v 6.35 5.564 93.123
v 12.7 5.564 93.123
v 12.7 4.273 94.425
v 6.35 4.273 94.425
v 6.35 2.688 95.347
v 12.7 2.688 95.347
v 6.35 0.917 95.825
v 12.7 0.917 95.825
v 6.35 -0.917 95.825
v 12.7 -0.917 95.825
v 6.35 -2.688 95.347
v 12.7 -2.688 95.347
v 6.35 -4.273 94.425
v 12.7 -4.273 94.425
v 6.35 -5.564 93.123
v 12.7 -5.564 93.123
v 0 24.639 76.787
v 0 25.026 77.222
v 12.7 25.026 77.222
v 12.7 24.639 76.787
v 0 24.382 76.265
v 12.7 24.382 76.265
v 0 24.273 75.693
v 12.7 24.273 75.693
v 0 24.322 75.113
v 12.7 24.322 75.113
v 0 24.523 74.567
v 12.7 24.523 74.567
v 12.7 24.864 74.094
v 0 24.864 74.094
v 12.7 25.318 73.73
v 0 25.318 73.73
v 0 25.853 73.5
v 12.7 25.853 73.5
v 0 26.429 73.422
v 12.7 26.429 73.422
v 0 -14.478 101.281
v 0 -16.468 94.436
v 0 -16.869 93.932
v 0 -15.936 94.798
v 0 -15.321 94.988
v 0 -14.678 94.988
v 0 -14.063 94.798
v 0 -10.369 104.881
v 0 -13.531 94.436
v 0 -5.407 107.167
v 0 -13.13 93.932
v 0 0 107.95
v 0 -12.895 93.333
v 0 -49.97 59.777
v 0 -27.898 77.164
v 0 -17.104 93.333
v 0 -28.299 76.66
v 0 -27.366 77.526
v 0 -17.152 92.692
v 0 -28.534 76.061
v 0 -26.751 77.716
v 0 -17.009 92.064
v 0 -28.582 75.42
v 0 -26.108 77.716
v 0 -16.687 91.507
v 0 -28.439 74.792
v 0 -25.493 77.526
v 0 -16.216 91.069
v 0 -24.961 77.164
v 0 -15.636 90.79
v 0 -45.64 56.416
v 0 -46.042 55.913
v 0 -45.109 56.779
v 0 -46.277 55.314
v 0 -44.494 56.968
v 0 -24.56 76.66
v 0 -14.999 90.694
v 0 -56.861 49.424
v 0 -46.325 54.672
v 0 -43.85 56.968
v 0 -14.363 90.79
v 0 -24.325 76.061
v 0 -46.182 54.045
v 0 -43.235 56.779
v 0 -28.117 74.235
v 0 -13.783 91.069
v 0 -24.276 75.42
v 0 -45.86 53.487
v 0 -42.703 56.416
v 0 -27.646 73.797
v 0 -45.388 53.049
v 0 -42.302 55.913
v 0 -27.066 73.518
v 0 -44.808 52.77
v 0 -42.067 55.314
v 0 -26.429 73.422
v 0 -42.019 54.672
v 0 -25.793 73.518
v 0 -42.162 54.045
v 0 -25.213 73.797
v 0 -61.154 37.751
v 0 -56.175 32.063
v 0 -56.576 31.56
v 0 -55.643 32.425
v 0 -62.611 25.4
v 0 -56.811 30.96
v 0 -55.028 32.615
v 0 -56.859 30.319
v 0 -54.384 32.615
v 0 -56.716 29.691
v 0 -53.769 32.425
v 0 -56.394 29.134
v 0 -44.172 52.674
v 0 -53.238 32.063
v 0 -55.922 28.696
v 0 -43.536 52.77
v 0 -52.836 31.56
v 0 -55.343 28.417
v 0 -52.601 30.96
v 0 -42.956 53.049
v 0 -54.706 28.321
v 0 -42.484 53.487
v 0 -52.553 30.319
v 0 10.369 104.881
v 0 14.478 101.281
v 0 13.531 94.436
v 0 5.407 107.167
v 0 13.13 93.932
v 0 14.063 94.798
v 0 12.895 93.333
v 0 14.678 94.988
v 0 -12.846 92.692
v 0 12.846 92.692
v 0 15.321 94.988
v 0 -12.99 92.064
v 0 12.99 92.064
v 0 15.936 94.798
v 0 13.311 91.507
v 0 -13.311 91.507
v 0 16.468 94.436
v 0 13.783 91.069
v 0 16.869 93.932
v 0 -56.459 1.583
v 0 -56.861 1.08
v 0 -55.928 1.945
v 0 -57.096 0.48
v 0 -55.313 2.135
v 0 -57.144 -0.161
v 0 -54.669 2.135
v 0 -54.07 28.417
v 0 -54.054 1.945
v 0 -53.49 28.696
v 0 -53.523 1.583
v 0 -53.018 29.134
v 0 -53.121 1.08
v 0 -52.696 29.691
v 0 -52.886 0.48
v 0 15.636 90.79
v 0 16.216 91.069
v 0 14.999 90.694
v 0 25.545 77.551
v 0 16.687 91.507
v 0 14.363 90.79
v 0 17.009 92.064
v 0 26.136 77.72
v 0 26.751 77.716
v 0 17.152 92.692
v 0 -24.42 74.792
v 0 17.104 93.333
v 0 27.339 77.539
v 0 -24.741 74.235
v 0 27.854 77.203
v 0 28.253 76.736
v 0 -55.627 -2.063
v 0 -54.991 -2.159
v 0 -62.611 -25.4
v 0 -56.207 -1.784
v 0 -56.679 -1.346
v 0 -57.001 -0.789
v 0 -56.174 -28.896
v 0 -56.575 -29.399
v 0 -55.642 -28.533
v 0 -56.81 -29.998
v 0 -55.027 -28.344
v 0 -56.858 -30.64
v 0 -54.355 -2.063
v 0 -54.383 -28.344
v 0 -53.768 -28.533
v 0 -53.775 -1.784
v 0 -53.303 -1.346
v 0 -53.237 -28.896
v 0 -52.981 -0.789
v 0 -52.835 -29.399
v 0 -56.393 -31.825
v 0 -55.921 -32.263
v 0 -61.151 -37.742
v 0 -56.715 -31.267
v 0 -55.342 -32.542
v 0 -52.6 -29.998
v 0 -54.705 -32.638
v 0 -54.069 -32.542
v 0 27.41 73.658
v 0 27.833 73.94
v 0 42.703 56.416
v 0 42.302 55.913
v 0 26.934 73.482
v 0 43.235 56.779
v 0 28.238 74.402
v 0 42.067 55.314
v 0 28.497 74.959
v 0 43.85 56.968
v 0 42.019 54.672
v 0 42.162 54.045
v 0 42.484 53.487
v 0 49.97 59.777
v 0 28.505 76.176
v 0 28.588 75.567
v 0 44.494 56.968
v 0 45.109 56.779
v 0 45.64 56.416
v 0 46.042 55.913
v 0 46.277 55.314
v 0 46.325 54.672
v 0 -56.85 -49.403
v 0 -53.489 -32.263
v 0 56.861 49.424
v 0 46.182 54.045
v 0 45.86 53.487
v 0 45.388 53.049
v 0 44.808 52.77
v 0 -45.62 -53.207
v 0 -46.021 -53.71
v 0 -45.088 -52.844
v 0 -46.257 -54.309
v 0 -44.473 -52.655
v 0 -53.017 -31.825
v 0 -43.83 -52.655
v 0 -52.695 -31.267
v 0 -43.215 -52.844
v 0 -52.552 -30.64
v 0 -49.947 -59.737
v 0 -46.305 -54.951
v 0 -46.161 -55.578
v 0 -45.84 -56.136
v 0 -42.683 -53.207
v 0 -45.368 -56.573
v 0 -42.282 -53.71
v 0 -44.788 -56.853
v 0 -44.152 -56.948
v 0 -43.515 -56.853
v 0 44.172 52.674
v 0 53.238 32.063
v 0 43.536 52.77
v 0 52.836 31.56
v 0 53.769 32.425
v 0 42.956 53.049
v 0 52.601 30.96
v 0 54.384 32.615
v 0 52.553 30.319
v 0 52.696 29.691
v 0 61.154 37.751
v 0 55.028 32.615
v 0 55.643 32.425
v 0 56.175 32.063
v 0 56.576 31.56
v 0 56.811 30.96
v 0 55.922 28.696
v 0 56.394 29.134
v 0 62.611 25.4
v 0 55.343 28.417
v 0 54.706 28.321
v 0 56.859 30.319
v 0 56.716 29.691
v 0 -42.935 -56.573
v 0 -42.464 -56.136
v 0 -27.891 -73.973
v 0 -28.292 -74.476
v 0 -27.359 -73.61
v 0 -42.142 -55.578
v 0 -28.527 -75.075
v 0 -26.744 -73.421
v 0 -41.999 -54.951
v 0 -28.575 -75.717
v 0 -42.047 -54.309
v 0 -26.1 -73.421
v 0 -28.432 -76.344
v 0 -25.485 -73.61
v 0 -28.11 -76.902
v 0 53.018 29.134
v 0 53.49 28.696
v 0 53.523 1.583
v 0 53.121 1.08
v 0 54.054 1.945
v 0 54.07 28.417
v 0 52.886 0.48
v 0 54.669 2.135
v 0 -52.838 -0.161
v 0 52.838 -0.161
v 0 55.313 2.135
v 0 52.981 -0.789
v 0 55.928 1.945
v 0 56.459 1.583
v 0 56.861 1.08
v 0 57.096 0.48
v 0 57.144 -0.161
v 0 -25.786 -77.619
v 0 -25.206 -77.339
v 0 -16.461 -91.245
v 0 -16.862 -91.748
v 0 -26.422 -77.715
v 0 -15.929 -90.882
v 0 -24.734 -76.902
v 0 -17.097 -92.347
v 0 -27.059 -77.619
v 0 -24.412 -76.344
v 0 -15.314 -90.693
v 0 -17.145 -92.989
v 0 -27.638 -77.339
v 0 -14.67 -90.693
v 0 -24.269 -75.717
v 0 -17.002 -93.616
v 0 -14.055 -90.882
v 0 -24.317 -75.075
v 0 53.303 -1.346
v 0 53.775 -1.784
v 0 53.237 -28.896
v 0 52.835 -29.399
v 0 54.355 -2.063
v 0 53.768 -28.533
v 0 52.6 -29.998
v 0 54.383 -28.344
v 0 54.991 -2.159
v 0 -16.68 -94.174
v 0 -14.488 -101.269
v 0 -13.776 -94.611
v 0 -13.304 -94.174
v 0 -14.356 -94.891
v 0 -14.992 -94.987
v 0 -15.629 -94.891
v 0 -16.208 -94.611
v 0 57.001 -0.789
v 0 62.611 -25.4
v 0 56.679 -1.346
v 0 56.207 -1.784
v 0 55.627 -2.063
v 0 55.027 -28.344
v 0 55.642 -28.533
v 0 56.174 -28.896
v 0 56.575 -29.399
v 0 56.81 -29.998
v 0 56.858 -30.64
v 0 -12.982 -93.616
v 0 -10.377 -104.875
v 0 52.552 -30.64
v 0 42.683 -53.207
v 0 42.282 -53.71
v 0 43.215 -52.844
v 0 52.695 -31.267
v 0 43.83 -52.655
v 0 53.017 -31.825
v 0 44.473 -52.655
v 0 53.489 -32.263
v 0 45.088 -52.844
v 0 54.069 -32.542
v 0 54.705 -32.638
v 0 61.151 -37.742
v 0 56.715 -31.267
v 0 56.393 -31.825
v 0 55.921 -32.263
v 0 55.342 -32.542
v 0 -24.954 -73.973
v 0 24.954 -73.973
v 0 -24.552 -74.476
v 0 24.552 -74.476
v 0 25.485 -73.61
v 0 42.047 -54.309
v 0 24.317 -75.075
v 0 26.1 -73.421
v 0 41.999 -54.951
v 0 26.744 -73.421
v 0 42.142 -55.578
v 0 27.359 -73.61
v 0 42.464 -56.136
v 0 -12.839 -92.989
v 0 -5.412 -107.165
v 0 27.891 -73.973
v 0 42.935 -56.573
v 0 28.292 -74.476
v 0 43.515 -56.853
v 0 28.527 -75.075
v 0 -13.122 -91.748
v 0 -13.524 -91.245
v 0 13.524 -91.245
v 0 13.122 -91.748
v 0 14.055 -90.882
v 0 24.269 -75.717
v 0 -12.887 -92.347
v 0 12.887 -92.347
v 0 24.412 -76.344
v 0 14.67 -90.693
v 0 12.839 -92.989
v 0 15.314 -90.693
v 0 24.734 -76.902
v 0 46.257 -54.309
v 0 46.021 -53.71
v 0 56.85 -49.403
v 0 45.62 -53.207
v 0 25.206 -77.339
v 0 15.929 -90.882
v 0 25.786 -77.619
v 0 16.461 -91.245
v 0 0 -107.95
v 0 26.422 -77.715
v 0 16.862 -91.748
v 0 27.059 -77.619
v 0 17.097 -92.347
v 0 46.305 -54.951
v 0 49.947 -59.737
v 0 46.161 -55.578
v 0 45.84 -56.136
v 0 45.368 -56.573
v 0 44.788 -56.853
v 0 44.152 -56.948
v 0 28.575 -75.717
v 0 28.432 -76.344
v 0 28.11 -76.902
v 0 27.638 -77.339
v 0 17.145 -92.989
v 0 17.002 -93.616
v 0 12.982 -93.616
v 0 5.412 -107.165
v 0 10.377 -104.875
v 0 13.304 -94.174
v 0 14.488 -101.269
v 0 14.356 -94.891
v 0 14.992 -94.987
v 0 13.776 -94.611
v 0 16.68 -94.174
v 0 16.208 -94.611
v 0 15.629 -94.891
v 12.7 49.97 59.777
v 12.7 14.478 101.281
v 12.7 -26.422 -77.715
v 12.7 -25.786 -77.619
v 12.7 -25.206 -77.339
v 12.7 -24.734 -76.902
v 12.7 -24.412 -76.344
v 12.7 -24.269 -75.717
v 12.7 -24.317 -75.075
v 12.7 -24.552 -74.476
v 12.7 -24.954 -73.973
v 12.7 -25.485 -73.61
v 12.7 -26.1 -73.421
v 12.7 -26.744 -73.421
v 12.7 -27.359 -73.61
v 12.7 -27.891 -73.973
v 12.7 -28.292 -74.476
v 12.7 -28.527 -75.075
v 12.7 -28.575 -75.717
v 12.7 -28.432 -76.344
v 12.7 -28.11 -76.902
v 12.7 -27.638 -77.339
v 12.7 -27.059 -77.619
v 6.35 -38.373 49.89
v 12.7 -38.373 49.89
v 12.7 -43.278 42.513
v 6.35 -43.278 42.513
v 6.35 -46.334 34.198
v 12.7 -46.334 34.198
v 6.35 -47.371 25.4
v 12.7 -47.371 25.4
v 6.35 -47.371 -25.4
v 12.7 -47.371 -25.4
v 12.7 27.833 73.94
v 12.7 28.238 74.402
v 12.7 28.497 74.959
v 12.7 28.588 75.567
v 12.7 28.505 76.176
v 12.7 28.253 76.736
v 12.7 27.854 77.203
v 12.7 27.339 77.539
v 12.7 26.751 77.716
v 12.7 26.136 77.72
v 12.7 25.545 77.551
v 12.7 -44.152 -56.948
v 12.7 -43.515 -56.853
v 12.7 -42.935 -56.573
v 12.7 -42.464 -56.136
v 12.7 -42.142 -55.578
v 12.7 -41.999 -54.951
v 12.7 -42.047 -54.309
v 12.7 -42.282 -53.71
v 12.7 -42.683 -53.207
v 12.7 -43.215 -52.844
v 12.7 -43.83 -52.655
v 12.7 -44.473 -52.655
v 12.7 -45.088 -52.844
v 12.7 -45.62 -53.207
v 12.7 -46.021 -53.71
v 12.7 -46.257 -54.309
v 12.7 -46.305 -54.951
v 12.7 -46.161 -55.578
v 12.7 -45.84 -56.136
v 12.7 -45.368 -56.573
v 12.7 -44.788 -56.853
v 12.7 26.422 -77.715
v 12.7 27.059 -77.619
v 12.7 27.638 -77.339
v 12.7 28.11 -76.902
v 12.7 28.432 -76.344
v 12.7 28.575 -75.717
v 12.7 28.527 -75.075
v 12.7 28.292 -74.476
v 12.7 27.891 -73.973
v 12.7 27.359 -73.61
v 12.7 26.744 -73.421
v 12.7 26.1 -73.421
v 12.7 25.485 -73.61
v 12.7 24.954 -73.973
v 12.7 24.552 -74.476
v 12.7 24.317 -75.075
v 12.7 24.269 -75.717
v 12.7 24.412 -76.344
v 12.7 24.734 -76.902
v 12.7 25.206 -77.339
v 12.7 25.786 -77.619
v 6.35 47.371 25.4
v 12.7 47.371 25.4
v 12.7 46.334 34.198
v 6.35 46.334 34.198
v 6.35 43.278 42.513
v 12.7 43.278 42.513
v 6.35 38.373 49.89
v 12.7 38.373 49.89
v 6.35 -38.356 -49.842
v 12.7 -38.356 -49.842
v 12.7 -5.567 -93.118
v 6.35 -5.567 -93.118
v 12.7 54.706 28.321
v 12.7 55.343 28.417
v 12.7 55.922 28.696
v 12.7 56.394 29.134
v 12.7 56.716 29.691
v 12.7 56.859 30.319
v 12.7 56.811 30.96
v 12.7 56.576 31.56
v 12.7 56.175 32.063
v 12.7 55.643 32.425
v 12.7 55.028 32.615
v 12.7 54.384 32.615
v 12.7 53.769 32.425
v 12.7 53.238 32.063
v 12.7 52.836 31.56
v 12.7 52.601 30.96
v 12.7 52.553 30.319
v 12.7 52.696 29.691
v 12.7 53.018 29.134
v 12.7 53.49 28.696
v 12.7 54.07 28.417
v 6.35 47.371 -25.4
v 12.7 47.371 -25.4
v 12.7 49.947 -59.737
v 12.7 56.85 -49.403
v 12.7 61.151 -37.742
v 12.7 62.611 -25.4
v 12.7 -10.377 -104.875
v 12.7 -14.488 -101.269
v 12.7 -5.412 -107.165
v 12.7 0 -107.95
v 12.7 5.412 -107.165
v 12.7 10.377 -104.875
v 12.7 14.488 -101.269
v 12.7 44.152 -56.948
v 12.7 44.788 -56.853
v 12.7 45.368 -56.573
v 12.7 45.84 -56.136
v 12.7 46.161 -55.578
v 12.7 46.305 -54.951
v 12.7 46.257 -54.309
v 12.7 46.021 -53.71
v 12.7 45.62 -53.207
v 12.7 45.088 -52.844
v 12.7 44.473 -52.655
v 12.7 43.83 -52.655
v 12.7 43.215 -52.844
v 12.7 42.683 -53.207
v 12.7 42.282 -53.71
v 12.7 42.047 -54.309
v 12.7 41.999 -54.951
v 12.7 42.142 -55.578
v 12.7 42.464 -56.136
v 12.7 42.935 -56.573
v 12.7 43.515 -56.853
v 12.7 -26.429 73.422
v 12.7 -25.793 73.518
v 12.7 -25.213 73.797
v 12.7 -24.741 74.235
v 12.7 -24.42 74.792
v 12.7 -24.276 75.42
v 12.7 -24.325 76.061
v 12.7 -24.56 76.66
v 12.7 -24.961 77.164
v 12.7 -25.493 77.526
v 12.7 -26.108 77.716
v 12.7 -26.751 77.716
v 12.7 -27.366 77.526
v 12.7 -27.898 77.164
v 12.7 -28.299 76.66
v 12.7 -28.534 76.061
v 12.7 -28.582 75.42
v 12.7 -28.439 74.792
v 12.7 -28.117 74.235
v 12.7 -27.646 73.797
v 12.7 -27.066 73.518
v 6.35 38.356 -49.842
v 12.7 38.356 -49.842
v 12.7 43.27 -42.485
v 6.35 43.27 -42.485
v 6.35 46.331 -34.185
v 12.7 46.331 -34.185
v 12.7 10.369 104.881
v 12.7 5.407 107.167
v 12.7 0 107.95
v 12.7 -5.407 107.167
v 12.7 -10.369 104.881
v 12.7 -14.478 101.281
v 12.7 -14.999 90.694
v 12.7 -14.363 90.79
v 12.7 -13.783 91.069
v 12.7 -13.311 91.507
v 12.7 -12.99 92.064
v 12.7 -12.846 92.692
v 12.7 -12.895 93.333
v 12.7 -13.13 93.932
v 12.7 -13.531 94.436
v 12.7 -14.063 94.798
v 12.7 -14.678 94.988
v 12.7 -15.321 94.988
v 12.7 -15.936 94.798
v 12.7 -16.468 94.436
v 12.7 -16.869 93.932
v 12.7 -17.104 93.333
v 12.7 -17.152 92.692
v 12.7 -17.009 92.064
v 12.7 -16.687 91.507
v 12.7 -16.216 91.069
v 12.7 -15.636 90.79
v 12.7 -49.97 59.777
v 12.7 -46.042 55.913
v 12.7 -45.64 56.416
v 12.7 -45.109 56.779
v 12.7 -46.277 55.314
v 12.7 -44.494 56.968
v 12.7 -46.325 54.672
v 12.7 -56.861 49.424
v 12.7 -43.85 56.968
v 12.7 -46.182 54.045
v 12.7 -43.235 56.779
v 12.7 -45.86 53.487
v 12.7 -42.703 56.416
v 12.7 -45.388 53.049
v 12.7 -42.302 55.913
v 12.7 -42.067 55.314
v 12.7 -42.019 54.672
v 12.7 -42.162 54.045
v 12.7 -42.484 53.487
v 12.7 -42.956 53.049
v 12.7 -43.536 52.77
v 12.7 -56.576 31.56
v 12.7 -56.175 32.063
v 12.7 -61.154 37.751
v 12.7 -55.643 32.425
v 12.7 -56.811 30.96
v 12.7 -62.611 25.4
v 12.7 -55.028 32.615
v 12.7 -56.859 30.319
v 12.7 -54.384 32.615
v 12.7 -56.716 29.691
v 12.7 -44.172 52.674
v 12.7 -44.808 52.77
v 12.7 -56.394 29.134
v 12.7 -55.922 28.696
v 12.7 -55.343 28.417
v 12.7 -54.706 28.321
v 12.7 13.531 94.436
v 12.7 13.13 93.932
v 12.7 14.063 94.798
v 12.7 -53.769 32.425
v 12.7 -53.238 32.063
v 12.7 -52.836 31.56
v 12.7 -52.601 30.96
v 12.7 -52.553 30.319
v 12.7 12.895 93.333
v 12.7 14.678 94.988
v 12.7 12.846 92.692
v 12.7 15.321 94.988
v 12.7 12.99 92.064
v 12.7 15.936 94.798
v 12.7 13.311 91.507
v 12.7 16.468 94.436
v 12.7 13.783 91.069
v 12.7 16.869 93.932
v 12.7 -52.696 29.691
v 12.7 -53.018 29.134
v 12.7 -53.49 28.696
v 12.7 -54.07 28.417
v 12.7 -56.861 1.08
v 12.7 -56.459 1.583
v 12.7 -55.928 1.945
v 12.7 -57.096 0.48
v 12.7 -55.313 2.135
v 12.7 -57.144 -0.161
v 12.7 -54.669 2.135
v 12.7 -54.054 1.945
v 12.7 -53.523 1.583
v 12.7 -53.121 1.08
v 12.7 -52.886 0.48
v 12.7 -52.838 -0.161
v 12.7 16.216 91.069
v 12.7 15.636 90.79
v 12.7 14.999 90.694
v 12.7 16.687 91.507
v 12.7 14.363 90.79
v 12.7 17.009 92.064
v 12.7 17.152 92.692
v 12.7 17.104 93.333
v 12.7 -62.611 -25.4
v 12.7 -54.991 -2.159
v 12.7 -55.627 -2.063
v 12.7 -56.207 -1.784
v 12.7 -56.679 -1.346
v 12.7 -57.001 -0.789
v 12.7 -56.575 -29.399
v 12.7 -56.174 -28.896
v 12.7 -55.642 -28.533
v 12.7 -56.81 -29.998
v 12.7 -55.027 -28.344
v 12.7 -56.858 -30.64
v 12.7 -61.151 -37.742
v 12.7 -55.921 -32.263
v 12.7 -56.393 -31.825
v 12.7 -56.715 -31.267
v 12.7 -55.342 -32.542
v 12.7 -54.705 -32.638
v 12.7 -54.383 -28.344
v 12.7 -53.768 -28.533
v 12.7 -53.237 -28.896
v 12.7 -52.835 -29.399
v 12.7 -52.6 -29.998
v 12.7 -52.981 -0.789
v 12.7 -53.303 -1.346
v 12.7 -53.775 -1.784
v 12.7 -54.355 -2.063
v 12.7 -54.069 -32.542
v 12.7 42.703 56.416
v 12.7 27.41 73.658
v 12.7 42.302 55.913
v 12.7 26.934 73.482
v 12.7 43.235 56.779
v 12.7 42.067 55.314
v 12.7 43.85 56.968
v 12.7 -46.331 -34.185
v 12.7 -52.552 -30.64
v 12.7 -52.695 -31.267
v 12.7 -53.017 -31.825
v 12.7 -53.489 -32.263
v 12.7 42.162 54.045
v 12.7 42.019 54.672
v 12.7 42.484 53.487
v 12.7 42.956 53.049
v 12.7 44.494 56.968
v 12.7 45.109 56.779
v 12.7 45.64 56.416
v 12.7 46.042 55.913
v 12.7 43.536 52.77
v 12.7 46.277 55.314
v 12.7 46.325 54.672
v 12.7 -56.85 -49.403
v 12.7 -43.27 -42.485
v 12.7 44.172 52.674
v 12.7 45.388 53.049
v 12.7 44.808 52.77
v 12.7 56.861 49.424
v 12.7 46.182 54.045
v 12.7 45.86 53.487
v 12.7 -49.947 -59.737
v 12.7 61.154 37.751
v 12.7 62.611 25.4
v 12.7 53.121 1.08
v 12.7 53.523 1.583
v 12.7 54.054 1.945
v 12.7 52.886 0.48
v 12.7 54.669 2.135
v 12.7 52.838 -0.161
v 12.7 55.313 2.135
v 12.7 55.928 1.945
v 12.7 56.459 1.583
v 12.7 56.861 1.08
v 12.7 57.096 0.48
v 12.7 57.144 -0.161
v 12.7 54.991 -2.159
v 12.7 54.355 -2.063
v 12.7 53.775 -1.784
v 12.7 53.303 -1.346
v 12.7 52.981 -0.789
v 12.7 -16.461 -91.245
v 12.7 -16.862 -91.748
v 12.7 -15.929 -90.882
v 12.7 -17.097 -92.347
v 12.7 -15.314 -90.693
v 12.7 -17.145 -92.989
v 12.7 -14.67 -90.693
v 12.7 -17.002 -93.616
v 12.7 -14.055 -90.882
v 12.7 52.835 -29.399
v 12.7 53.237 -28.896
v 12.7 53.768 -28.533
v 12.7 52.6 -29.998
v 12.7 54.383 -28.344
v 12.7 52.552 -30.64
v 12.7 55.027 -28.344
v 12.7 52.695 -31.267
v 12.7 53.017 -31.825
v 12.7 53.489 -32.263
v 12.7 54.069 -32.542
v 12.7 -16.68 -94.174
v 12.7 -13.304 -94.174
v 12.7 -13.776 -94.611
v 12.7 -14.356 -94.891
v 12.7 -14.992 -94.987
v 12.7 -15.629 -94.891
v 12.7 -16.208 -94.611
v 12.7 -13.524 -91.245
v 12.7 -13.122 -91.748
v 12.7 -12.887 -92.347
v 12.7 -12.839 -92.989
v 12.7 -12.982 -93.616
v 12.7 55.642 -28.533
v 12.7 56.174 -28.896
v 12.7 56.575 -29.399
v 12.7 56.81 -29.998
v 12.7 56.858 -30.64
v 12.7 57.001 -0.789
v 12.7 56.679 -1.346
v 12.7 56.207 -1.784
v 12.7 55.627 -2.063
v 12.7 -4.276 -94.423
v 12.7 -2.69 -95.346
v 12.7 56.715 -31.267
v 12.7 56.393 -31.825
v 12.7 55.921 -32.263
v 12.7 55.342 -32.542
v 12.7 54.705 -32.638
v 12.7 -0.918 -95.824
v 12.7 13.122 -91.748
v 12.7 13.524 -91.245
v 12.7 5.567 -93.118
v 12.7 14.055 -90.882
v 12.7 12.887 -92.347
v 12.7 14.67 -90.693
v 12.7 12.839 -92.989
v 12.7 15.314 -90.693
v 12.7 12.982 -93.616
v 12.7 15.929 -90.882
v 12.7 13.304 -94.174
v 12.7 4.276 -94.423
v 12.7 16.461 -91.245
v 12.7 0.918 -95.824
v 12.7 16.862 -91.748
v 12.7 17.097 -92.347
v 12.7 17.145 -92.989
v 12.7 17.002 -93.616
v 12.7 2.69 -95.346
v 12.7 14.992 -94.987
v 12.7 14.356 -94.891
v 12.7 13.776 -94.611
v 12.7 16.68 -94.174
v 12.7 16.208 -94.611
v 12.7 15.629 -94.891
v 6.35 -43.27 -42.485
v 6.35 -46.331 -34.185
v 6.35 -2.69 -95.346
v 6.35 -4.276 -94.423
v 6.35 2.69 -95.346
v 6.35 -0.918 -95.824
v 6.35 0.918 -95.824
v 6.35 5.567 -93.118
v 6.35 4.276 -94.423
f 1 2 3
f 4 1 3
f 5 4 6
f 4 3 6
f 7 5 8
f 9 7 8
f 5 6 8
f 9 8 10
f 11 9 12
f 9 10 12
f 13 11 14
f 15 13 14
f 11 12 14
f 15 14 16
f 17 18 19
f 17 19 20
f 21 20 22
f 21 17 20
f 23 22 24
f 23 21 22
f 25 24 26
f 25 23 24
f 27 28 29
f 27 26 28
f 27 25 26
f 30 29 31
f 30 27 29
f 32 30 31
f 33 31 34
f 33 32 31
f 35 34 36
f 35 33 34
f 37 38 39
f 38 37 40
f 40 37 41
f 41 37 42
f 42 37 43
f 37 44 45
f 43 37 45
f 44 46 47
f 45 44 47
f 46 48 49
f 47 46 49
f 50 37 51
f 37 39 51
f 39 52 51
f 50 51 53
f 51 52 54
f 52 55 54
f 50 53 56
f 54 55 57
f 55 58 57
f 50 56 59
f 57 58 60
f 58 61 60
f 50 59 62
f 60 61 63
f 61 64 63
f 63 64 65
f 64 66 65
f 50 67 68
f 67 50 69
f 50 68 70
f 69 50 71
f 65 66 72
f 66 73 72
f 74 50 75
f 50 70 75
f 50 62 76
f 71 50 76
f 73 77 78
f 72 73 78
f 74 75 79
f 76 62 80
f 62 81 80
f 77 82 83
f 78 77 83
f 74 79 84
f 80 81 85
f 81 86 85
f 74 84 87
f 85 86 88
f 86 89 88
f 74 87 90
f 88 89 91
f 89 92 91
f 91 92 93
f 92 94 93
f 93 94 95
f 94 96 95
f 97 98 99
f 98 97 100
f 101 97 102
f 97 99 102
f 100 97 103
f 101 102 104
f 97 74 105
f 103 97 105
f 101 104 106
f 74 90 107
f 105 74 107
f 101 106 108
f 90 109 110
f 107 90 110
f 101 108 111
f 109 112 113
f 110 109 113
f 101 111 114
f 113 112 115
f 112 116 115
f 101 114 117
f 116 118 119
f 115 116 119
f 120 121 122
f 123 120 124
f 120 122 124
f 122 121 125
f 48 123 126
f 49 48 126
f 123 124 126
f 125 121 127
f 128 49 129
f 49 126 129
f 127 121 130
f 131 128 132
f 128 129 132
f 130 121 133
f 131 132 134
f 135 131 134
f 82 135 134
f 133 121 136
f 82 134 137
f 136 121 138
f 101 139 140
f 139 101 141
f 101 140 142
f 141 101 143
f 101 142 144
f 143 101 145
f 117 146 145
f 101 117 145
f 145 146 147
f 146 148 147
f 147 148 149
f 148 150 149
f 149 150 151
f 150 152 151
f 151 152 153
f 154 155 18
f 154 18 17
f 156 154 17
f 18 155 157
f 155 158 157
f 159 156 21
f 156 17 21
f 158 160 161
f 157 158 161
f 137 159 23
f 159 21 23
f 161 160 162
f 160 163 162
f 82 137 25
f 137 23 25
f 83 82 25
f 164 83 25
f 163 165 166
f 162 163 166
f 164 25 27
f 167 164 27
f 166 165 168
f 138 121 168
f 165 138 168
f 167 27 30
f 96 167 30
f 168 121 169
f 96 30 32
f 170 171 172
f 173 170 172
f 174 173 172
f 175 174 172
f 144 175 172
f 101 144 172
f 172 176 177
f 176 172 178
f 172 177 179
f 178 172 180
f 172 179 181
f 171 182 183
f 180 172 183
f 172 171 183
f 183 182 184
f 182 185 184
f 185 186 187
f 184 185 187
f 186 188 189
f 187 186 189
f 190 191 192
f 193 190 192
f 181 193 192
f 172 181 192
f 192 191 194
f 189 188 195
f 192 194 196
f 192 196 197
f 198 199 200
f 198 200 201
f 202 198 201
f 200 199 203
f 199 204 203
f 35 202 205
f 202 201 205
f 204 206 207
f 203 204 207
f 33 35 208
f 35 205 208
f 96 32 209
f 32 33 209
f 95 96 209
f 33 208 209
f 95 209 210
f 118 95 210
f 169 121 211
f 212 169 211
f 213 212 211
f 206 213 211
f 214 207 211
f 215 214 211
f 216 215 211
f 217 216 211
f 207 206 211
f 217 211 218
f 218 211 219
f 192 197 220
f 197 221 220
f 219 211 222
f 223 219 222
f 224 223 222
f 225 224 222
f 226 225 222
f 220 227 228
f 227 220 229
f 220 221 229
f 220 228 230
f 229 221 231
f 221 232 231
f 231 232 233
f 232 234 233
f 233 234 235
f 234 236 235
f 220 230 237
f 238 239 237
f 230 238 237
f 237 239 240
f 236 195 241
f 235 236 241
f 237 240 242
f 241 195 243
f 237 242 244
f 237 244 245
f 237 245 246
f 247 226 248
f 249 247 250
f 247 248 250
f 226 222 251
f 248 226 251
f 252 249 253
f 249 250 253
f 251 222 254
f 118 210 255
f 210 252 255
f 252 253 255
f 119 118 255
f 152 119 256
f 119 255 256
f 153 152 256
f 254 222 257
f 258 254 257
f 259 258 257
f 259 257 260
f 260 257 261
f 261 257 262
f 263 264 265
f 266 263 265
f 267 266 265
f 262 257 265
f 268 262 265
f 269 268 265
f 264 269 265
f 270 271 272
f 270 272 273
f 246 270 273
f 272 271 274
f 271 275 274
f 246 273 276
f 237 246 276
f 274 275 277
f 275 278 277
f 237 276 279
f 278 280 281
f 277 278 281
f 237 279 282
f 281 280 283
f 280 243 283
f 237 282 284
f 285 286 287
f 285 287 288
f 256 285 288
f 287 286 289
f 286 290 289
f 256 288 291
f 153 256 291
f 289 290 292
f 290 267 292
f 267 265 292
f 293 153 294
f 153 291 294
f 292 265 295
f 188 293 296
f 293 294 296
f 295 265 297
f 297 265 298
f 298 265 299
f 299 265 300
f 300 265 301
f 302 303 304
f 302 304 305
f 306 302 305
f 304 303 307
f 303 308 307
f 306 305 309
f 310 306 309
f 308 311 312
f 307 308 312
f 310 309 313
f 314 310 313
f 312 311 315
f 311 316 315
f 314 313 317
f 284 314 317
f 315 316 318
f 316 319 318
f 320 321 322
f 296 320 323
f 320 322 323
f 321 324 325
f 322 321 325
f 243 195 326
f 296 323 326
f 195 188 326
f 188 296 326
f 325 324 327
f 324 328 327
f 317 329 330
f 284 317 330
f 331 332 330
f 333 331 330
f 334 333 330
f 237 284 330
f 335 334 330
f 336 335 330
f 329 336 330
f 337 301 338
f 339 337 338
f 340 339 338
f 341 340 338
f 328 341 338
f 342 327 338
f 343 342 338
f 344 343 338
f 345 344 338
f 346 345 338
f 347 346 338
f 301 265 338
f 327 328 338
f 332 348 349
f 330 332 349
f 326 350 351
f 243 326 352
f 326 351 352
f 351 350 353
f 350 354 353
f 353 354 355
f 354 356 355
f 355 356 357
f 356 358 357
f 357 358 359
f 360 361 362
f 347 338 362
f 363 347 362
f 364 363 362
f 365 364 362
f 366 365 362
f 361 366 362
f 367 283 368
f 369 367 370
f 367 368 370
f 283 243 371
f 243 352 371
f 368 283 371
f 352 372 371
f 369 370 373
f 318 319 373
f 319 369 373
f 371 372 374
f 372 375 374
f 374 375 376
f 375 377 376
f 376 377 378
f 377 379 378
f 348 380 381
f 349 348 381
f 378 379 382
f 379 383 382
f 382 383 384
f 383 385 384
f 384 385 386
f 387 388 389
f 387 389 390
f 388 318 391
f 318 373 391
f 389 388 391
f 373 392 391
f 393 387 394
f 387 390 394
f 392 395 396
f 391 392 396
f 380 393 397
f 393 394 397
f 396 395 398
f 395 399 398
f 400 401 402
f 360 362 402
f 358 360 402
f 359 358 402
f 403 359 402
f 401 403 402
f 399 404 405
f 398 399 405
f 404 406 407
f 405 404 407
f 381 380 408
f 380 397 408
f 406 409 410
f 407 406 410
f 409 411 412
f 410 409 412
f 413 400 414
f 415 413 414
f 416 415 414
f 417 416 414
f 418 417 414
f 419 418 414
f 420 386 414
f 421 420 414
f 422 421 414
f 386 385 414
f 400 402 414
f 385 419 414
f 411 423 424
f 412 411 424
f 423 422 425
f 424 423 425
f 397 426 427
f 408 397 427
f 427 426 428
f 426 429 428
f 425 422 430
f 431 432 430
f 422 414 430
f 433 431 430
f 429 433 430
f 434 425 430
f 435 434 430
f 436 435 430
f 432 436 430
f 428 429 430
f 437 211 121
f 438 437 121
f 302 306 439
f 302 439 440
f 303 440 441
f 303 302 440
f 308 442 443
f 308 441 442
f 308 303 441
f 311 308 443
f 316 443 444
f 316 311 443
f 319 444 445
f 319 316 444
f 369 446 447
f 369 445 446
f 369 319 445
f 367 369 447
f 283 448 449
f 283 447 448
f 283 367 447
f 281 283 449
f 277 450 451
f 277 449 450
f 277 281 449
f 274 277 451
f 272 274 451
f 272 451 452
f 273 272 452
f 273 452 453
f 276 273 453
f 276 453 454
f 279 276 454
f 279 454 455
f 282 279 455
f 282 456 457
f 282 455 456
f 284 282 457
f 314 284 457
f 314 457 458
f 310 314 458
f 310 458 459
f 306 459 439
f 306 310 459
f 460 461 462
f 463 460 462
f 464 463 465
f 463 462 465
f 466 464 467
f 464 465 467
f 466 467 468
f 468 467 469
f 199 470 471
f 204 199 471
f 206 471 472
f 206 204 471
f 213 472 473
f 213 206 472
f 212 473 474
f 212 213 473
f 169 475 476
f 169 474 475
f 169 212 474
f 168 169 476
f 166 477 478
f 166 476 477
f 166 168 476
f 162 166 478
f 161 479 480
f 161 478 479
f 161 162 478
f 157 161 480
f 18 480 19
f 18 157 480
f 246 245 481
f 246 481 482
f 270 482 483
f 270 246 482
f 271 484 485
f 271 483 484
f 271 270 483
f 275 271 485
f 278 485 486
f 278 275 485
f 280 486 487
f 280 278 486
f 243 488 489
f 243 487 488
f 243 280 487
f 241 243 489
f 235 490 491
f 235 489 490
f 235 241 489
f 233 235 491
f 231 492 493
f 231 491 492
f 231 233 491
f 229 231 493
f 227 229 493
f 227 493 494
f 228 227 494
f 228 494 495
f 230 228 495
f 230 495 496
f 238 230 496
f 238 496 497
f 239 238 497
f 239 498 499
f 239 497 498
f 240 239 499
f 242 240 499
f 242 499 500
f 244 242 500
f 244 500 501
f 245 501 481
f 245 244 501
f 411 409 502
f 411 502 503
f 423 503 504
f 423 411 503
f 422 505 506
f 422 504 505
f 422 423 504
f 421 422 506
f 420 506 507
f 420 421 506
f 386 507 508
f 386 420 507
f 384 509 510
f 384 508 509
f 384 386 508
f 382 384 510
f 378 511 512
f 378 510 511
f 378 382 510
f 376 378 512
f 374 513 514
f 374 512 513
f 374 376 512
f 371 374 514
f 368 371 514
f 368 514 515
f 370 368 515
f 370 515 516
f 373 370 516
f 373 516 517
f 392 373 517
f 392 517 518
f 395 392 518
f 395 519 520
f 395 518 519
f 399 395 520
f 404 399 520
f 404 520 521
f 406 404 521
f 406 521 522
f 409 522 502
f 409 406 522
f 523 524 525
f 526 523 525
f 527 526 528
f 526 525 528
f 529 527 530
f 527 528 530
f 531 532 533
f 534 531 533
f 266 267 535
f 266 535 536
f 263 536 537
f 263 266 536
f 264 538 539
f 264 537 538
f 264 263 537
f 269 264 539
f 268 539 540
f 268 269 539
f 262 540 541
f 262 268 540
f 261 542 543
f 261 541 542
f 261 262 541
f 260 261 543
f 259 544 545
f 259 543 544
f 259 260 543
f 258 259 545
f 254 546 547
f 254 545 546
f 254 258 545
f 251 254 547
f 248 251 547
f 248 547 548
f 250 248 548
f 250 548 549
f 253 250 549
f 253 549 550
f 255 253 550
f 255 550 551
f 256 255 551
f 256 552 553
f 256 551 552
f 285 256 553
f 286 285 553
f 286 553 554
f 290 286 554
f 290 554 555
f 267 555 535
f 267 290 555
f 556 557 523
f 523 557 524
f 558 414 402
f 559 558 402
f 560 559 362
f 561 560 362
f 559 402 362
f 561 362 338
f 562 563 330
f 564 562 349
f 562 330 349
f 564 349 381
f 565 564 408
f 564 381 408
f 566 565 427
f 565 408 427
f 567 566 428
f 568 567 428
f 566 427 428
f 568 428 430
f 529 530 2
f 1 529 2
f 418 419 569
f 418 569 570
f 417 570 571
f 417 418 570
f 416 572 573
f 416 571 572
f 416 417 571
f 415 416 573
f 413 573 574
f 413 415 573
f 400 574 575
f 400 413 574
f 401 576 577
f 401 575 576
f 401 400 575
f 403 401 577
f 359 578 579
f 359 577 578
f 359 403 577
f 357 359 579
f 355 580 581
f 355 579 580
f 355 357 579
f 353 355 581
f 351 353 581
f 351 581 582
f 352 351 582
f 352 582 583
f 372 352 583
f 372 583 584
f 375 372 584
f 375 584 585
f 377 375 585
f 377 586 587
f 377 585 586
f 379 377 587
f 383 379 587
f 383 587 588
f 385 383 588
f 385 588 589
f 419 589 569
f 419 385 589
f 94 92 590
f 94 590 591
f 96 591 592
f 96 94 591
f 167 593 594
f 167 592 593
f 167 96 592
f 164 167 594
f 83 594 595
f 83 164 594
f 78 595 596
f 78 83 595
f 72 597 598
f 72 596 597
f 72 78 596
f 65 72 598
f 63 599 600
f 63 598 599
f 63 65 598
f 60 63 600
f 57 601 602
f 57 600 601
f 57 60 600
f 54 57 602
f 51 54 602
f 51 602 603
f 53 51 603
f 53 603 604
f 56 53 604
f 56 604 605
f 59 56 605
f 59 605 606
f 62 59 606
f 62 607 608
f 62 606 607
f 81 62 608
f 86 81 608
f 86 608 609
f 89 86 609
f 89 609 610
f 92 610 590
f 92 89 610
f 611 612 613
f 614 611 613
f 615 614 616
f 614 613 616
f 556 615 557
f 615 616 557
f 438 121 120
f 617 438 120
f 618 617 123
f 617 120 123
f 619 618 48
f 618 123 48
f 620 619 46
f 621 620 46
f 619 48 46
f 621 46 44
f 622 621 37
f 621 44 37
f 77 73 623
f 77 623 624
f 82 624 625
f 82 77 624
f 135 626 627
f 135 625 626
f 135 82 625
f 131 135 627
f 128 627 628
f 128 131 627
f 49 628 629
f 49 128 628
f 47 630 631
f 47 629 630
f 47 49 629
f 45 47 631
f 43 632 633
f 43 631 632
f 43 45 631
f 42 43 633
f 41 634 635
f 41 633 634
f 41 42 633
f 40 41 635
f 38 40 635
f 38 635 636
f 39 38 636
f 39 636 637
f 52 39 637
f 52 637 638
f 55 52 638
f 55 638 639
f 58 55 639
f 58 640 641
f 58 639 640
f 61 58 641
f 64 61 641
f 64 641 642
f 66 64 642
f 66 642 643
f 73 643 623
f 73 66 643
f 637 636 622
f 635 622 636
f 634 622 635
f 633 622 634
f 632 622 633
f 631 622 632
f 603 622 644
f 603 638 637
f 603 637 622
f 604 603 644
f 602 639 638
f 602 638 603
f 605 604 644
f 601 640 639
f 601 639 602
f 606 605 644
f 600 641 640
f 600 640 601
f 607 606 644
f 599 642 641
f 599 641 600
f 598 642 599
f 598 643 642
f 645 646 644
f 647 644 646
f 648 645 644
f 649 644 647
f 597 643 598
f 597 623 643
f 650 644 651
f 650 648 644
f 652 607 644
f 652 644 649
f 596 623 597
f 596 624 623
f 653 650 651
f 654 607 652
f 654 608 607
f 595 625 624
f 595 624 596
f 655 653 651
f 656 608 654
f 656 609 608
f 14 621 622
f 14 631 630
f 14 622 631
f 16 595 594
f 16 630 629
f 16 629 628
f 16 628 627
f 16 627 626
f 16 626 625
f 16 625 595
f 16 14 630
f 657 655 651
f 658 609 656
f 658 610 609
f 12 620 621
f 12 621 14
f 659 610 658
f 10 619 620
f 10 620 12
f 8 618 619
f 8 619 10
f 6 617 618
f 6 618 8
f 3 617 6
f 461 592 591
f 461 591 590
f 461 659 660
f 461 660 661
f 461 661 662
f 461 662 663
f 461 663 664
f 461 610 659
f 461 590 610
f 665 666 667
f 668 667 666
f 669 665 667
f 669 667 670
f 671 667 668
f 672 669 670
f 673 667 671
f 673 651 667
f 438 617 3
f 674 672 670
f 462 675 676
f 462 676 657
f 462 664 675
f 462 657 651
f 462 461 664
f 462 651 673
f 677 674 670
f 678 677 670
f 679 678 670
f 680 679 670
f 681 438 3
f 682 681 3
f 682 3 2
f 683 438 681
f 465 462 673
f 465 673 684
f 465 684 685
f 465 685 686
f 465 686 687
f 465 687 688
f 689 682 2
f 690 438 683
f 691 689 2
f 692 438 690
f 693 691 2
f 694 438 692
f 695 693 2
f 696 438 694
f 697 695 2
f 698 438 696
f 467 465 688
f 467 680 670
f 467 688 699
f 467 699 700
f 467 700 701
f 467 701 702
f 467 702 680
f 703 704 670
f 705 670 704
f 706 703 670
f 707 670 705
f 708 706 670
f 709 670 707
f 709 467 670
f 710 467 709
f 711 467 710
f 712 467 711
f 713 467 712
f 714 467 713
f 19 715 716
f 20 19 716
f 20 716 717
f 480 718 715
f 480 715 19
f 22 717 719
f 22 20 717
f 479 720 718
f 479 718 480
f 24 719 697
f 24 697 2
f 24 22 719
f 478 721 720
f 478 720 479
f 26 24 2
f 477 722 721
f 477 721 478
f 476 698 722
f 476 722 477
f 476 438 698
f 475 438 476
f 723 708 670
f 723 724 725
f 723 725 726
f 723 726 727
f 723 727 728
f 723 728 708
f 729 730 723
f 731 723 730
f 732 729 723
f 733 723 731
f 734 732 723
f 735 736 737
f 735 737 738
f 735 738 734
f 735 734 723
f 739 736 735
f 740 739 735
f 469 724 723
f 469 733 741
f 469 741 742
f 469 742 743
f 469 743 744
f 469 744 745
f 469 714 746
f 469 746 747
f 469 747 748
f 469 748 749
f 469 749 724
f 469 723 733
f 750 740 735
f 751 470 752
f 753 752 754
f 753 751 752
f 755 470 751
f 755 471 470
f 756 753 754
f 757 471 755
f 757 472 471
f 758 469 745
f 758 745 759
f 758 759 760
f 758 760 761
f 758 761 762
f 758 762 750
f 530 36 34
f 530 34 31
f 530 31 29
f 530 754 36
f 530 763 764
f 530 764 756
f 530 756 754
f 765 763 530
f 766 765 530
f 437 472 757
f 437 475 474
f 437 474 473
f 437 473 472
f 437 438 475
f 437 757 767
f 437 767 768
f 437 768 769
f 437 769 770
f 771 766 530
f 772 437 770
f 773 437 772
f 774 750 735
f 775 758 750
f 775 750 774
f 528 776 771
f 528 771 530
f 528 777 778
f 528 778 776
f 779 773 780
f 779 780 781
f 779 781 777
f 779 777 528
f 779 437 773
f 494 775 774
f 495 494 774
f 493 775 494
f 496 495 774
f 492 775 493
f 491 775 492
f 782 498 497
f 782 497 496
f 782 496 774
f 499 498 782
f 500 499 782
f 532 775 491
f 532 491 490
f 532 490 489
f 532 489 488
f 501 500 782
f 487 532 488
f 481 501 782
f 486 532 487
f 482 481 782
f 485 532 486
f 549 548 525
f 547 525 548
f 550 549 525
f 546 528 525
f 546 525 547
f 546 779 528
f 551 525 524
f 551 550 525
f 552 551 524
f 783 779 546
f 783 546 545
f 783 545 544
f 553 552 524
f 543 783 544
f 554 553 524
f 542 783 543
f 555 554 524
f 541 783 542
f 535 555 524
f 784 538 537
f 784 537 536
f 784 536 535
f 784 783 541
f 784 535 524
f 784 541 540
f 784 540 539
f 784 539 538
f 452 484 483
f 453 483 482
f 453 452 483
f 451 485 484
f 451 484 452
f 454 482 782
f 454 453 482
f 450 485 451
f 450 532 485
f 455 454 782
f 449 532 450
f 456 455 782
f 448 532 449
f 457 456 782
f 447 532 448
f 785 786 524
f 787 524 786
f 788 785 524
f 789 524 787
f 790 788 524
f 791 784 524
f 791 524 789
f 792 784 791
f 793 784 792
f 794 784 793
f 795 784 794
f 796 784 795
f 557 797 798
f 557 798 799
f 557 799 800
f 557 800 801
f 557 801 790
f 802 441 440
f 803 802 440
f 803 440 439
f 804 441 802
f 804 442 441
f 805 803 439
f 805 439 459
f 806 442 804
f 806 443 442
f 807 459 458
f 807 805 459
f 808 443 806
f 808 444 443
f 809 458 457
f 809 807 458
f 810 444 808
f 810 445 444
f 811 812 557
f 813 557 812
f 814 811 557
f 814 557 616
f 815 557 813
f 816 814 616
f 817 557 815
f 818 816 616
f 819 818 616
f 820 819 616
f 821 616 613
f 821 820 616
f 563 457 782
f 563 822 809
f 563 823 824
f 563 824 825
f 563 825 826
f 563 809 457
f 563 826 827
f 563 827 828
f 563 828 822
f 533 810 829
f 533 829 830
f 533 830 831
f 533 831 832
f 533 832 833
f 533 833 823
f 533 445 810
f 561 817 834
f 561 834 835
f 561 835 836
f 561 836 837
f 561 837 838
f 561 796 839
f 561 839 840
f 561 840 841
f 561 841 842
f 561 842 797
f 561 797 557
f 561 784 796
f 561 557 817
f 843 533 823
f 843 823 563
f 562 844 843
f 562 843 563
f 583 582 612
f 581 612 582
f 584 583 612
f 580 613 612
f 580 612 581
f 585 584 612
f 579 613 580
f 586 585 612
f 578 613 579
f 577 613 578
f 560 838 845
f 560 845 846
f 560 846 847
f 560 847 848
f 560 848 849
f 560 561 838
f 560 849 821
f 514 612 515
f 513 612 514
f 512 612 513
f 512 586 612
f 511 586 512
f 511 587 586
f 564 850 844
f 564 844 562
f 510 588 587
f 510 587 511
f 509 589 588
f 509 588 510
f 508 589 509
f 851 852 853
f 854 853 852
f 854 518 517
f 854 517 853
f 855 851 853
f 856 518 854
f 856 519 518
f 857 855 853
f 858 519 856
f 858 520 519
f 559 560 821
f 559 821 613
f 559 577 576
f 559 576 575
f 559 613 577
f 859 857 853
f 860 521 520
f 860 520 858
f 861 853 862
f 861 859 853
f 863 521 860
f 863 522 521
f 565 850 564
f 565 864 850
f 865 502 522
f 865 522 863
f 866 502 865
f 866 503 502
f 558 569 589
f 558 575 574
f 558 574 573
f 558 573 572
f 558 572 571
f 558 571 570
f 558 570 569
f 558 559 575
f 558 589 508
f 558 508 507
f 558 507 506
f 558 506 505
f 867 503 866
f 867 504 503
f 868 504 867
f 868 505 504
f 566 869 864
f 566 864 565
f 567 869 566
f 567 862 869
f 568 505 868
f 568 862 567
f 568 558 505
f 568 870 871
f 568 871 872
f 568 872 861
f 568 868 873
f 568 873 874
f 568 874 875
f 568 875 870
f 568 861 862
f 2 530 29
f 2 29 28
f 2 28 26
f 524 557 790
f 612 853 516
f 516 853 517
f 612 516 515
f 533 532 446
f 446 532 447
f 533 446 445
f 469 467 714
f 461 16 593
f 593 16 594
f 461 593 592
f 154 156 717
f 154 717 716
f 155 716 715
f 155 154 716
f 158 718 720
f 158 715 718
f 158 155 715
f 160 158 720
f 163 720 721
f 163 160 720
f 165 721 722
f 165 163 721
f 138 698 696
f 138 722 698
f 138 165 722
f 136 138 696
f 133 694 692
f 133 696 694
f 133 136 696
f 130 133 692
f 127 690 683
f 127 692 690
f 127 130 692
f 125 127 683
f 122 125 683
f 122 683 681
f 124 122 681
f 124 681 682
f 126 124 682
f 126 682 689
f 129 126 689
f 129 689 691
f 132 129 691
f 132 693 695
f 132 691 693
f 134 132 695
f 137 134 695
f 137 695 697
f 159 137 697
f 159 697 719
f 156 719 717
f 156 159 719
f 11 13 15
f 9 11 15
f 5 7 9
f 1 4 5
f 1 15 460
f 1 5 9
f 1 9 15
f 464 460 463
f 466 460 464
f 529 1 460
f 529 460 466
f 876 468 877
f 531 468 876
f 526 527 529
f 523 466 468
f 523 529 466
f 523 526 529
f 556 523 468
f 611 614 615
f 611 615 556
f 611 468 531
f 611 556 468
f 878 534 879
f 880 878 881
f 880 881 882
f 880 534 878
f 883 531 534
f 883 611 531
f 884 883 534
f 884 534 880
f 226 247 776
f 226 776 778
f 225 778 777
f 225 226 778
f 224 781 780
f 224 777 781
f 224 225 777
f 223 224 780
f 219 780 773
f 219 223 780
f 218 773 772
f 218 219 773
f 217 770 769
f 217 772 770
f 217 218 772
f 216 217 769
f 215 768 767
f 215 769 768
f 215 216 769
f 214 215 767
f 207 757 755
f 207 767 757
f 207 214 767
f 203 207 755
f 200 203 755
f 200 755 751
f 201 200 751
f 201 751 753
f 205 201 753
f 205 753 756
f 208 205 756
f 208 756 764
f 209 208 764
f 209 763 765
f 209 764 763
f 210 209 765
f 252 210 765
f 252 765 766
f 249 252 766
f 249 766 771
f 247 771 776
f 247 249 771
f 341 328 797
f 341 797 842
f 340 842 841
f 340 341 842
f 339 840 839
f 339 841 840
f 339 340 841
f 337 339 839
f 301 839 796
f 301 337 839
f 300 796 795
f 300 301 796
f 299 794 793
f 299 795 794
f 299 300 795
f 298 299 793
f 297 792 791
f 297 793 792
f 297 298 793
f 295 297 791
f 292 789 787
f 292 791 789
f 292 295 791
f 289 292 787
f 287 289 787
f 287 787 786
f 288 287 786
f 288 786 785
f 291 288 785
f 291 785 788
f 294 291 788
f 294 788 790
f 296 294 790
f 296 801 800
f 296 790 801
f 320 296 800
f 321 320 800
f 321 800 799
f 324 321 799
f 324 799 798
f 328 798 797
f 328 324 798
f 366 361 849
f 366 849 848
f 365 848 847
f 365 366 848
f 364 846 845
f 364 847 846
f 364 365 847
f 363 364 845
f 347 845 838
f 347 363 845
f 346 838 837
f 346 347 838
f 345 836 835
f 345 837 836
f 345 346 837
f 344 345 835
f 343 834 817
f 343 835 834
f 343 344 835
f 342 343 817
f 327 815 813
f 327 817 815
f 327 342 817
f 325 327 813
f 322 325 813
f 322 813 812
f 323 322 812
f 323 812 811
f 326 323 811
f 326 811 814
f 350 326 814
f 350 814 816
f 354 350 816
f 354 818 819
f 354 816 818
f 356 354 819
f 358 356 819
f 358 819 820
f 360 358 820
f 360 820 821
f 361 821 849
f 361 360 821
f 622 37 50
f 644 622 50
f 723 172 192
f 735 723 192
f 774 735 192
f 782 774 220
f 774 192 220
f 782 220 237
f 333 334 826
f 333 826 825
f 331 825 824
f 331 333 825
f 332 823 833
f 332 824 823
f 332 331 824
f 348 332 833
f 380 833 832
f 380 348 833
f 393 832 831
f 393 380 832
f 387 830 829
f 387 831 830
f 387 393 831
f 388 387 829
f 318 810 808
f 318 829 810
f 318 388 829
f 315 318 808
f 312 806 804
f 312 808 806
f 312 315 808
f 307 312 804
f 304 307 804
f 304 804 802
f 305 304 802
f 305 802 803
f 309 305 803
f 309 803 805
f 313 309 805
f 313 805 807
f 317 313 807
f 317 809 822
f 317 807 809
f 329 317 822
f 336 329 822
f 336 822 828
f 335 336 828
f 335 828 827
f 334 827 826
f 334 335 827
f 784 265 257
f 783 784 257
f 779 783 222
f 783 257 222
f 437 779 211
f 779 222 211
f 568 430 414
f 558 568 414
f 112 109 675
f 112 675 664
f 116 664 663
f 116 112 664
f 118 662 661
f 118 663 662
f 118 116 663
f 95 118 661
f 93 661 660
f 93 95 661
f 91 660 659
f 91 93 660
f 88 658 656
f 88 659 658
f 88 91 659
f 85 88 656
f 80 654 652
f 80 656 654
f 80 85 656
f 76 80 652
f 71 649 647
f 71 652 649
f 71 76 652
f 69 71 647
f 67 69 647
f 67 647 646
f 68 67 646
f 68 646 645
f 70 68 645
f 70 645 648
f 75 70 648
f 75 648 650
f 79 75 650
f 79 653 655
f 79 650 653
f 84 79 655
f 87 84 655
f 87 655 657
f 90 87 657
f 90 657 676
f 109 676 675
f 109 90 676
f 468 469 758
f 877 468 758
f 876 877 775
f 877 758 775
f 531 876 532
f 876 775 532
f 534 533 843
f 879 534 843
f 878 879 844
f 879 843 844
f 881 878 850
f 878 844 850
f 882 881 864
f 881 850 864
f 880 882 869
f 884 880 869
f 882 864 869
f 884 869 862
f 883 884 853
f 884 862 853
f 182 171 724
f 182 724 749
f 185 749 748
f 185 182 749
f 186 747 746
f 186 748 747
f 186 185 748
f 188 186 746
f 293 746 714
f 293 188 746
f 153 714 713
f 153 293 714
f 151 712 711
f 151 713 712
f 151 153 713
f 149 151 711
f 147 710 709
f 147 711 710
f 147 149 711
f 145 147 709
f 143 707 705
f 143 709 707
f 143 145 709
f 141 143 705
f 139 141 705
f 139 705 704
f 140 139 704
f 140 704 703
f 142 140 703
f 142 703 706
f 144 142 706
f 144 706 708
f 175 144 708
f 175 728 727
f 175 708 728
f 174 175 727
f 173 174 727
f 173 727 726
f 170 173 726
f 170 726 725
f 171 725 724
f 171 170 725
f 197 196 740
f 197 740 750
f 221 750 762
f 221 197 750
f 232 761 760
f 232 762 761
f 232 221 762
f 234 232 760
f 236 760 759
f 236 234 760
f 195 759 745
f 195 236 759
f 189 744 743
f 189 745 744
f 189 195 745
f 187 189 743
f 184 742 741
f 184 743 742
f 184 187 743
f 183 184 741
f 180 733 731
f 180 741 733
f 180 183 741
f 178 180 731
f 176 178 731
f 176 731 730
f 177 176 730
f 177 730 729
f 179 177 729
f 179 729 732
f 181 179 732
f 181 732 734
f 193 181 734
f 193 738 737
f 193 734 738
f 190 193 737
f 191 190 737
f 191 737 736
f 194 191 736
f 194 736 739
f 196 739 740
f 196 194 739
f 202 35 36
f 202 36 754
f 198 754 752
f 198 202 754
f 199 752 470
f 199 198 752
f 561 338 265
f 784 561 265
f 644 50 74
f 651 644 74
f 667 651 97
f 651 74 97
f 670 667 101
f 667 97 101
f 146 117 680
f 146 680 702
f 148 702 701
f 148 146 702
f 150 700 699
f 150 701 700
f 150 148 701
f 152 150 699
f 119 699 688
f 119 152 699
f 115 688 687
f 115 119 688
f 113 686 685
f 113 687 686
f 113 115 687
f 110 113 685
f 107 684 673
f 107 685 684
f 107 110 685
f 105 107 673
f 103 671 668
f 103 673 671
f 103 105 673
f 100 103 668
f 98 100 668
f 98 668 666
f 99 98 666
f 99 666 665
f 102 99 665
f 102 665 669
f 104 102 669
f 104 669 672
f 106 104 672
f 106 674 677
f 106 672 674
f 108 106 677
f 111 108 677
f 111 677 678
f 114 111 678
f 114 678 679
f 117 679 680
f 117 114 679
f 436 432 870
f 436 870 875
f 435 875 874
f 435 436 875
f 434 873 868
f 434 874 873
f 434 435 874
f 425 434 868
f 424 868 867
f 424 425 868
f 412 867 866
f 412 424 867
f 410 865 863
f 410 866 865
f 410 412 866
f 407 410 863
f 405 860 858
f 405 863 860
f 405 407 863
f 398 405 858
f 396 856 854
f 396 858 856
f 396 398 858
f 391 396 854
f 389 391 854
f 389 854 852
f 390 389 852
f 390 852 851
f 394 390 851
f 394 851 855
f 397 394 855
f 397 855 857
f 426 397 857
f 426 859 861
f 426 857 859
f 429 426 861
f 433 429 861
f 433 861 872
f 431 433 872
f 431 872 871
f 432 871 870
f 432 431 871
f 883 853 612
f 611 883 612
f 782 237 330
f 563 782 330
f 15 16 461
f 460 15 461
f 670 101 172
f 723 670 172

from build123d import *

# Parameters (mm, degrees)
SKETCH1_R               = 19.05
BOSS_EXTRUDE1_DEPTH     = 12.7
CUT_EXTRUDE1_DEPTH      = 6.35
CUT_EXTRUDE3_DEPTH      = 126.437752774
CUT_EXTRUDE3_DEPTH_BACK = 126.437752774
SKETCH4_R               = 2.159


with BuildPart() as part:
    # Sketch1 → Boss-Extrude1 (new body)
    with BuildSketch(Plane(origin=(0, 0, 0), x_dir=(0, 0, -1), z_dir=(1, 0, 0))):
        with BuildLine():
            Line((25.4, 62.611), (-25.4, 62.611))
            ThreePointArc((-25.4, 62.611), (-43.71389723, 59.350669702), (-59.777434529, 49.970298982))
            Line((-59.777434529, 49.970298982), (-101.281034529, 14.478))
            ThreePointArc((-101.281034529, 14.478), (-80.929937509, 17.302618411), (-69.85, 0))
            ThreePointArc((-69.85, 0), (-80.929937509, -17.302618411), (-101.281034529, -14.478))
            Line((-101.281034529, -14.478), (-59.777434529, -49.970298982))
            ThreePointArc((-59.777434529, -49.970298982), (-43.71389723, -59.350669702), (-25.4, -62.611))
            Line((-25.4, -62.611), (25.4, -62.611))
            ThreePointArc((25.4, -62.611), (43.699078076, -59.34404997), (59.737214243, -49.946847768))
            Line((59.737214243, -49.946847768), (101.269374674, -14.487973703))
            ThreePointArc((101.269374674, -14.487973703), (69.85, -7.706e-06), (101.269379322, 14.48794821))
            Line((101.269379322, 14.48794821), (59.737230268, 49.9468356))
            ThreePointArc((59.737230268, 49.9468356), (43.699087699, 59.344046737), (25.4, 62.611))
        make_face()
        with Locations((88.9, -1.0762e-05)):
            Circle(SKETCH1_R)
        with Locations((-88.9, 0)):
            Circle(SKETCH1_R)
    extrude(amount=BOSS_EXTRUDE1_DEPTH)

    # Sketch2 → Cut-Extrude1 (cut)
    with BuildSketch(Plane(origin=(12.7, 0, 0), x_dir=(0, 0, -1), z_dir=(1, 0, 0))):
        with BuildLine():
            Line((-49.889980522, 38.373041727), (-93.122597105, 5.564161993))
            ThreePointArc((-93.122597105, 5.564161993), (-95.885, 0), (-93.122597105, -5.564161993))
            Line((-93.122597105, -5.564161993), (-49.889980522, -38.373041727))
            ThreePointArc((-49.889980522, -38.373041727), (-38.445328657, -45.050322999), (-25.4, -47.371))
            Line((-25.4, -47.371), (25.4, -47.371))
            ThreePointArc((25.4, -47.371), (38.425542458, -45.045538785), (49.841714504, -38.356477415))
            Line((49.841714504, -38.356477415), (93.118252802, -5.56746694))
            ThreePointArc((93.118252802, -5.56746694), (95.885, -1.1883e-05), (93.118254588, 5.567444063))
            Line((93.118254588, 5.567444063), (49.84172681, 38.356468422))
            ThreePointArc((49.84172681, 38.356468422), (38.425549787, 45.045536399), (25.4, 47.371))
            Line((25.4, 47.371), (-25.4, 47.371))
            ThreePointArc((-25.4, 47.371), (-38.445328657, 45.050322999), (-49.889980522, 38.373041727))
        make_face()
    extrude(amount=-CUT_EXTRUDE1_DEPTH, mode=Mode.SUBTRACT)

    # Sketch4 → Cut-Extrude3 (cut, two sides: drawn at the far end of the back side and taken through both)
    with BuildSketch(Plane(origin=(12.7, 0, 0), x_dir=(0, 0, -1), z_dir=(1, 0, 0)).offset(-CUT_EXTRUDE3_DEPTH_BACK)):
        with BuildLine():
            ThreePointArc((-73.940141084, 27.832575617), (-76.984164998, 28.070231704), (-77.221821084, 25.02620779))
            Line((-77.221821084, 25.02620779), (-73.940141084, 27.832575617))
        make_face()
        with BuildLine():
            Line((-73.940141084, 27.832575617), (-77.221821084, 25.02620779))
            ThreePointArc((-77.221821084, 25.02620779), (-74.833081546, 24.404070178), (-73.421981084, 26.429391704))
            ThreePointArc((-73.421981084, 26.429391704), (-73.555659559, 27.177291242), (-73.940141084, 27.832575617))
        make_face()
        with Locations((-54.833341451, 44.171983407)):
            Circle(SKETCH4_R)
        with Locations((-30.48, 54.706186836)):
            Circle(SKETCH4_R)
        with Locations((0, 54.991)):
            Circle(SKETCH4_R)
        with Locations((30.478659799, 54.70517335)):
            Circle(SKETCH4_R)
        with Locations((54.789478539, 44.151652011)):
            Circle(SKETCH4_R)
        with Locations((75.555553066, 26.422208316)):
            Circle(SKETCH4_R)
        with Locations((92.827553066, 14.992208316)):
            Circle(SKETCH4_R)
        with Locations((92.827553066, -14.992208316)):
            Circle(SKETCH4_R)
        with Locations((75.555553066, -26.422208316)):
            Circle(SKETCH4_R)
        with Locations((54.789478539, -44.151652011)):
            Circle(SKETCH4_R)
        with Locations((30.478659799, -54.70517335)):
            Circle(SKETCH4_R)
        with Locations((0, -54.991)):
            Circle(SKETCH4_R)
        with Locations((-30.48, -54.706186836)):
            Circle(SKETCH4_R)
        with Locations((-54.833341451, -44.171983407)):
            Circle(SKETCH4_R)
        with Locations((-75.580981084, -26.429391704)):
            Circle(SKETCH4_R)
        with Locations((-92.852981084, -14.999391704)):
            Circle(SKETCH4_R)
        with Locations((-92.852981084, 14.999391704)):
            Circle(SKETCH4_R)
    extrude(amount=CUT_EXTRUDE3_DEPTH + CUT_EXTRUDE3_DEPTH_BACK, mode=Mode.SUBTRACT)


solid = part.part
